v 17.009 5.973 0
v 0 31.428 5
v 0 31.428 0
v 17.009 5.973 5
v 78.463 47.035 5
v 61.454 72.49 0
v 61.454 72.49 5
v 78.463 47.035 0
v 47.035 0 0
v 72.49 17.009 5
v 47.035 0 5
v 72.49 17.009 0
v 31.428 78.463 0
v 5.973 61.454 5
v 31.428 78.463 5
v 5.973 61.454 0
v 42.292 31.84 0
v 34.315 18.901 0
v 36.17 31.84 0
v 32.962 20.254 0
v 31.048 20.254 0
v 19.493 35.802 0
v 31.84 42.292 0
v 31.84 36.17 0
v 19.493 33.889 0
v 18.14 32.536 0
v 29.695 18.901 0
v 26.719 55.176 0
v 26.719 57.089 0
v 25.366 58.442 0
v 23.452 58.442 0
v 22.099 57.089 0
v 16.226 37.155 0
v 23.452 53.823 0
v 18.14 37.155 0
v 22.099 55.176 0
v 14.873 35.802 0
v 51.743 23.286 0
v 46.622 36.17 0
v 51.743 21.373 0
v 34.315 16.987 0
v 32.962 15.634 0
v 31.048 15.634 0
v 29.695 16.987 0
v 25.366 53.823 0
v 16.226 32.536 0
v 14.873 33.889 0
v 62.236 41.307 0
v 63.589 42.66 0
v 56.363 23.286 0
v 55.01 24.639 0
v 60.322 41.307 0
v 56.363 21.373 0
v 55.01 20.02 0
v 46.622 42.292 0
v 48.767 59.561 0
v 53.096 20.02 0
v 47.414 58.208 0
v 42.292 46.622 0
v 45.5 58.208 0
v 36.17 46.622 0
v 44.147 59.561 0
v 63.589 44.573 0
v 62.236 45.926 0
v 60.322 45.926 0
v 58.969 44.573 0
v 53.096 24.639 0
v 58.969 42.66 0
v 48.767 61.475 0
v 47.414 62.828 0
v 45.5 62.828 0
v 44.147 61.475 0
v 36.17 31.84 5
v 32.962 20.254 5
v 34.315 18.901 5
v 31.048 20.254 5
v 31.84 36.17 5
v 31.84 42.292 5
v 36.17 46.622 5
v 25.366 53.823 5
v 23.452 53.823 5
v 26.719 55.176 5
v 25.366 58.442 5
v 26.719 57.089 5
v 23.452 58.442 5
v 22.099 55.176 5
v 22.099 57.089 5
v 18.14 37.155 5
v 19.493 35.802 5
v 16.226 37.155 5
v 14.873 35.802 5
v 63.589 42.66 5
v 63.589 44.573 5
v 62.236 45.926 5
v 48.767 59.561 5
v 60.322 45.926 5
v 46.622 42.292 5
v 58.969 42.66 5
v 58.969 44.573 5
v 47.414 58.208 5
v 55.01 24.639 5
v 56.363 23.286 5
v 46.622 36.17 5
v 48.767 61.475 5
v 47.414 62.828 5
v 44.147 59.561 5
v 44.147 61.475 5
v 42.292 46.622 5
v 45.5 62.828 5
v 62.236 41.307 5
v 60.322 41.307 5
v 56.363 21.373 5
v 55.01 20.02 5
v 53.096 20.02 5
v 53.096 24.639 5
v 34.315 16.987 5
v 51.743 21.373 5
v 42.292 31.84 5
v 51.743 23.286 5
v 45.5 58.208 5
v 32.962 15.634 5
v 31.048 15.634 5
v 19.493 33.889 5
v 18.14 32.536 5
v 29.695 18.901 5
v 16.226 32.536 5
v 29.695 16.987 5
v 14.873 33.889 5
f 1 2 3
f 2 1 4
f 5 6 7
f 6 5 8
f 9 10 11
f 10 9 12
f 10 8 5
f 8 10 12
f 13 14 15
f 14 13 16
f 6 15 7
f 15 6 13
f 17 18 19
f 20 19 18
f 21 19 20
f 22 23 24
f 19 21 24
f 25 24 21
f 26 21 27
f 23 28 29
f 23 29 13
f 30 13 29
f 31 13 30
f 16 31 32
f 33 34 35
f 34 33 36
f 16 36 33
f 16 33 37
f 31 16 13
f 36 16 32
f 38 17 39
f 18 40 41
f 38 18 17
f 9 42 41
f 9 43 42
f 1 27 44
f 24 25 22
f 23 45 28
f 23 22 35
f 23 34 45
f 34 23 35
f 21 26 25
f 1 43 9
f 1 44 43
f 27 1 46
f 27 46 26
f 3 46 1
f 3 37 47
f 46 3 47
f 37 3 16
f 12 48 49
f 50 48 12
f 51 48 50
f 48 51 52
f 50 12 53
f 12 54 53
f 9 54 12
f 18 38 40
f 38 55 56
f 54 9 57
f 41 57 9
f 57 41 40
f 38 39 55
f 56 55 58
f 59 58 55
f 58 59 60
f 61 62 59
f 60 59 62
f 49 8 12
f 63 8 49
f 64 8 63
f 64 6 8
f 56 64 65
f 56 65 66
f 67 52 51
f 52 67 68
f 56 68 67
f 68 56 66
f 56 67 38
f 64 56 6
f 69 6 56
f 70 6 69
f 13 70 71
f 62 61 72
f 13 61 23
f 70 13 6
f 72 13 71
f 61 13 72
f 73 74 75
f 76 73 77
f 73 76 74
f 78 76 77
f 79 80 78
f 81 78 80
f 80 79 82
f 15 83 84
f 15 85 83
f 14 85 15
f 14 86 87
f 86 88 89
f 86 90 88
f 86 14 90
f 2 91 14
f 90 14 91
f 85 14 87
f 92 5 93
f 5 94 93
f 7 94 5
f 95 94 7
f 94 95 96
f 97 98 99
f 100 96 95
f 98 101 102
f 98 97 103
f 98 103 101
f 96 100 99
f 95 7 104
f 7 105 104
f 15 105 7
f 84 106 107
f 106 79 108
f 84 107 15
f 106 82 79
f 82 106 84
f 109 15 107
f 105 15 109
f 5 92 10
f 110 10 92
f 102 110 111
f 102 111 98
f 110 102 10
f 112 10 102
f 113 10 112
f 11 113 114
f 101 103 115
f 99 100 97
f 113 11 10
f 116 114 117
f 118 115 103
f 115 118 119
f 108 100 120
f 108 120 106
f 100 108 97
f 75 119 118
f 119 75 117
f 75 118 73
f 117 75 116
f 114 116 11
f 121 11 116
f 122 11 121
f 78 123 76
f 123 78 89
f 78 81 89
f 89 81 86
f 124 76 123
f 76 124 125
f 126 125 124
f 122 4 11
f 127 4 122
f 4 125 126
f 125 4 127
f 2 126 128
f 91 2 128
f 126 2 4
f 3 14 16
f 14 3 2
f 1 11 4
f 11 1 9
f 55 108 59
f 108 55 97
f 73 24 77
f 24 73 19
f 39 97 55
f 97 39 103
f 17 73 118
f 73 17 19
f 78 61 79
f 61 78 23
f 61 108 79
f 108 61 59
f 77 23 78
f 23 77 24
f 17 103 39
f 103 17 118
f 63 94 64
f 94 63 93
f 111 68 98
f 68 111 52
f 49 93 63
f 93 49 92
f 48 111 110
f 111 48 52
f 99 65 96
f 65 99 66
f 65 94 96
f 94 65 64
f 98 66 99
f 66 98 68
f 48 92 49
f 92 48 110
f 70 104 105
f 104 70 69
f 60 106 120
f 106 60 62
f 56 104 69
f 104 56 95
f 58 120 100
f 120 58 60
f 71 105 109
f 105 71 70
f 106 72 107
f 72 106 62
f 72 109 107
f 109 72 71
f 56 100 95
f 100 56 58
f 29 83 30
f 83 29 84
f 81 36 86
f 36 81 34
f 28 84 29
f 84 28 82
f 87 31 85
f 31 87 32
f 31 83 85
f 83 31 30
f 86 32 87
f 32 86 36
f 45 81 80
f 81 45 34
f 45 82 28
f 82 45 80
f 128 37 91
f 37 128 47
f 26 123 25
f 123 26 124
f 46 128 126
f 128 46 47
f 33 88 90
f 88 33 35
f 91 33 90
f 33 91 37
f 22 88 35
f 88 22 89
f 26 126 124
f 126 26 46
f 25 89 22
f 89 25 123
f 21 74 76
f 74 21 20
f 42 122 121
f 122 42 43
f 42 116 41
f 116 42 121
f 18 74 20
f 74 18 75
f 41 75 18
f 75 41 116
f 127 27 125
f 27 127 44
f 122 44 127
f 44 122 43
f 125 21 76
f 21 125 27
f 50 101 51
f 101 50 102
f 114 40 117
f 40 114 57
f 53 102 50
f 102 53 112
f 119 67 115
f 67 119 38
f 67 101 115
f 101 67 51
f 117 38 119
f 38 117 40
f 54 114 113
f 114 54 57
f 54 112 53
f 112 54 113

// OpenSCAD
$fn = 32;

// ----------------------------------------------------------------------
// Polygon plate: 8-gon R40, 6 bolt windows
// ----------------------------------------------------------------------

// --- parameters (mm) ---
sides = 8;                // number of polygon sides
plate_r = 40;             // circumscribed radius of the polygon
bore_r = 8;               // centre bore radius
bolts = 6;                // number of bolt windows
ring_r = 22.48;           // bolt-circle radius
bolt_r = 2.5;             // bolt window radius
plate_t = 5;              // plate thickness, Z (extrusion height)
fit_tol = 0.05;           // declared fit tolerance (prompt contract)
free_tol = 0.2;           // declared free tolerance (prompt contract)

plate_d = 2 * plate_r;  // circumscribed diameter
bore_d = 2 * bore_r;  // centre bore diameter
bolt_d = 2 * bolt_r;  // bolt window diameter
ring_d = 2 * ring_r;  // bolt-circle diameter

profile = [[78.463, 47.035], [61.454, 72.49], [31.428, 78.463], [5.973, 61.454], [0, 31.428], [17.009, 5.973], [47.035, 0], [72.49, 17.009]];  // primary outline, 8 points, counter clockwise
void_1 = [[46.622, 42.292], [42.292, 46.622], [36.17, 46.622], [31.84, 42.292], [31.84, 36.17], [36.17, 31.84], [42.292, 31.84], [46.622, 36.17]];  // centre bore, 8 points
void_2 = [[63.589, 44.573], [62.236, 45.926], [60.322, 45.926], [58.969, 44.573], [58.969, 42.66], [60.322, 41.307], [62.236, 41.307], [63.589, 42.66]];  // bolt window 1, 8 points
void_3 = [[48.767, 61.475], [47.414, 62.828], [45.5, 62.828], [44.147, 61.475], [44.147, 59.561], [45.5, 58.208], [47.414, 58.208], [48.767, 59.561]];  // bolt window 2, 8 points
void_4 = [[26.719, 57.089], [25.366, 58.442], [23.452, 58.442], [22.099, 57.089], [22.099, 55.176], [23.452, 53.823], [25.366, 53.823], [26.719, 55.176]];  // bolt window 3, 8 points
void_5 = [[19.493, 35.802], [18.14, 37.155], [16.226, 37.155], [14.873, 35.802], [14.873, 33.889], [16.226, 32.536], [18.14, 32.536], [19.493, 33.889]];  // bolt window 4, 8 points
void_6 = [[34.315, 18.901], [32.962, 20.254], [31.048, 20.254], [29.695, 18.901], [29.695, 16.987], [31.048, 15.634], [32.962, 15.634], [34.315, 16.987]];  // bolt window 5, 8 points
void_7 = [[56.363, 23.286], [55.01, 24.639], [53.096, 24.639], [51.743, 23.286], [51.743, 21.373], [53.096, 20.02], [55.01, 20.02], [56.363, 21.373]];  // bolt window 6, 8 points

// --- the one profile operation ---
difference() {
  linear_extrude(height = plate_t) polygon(points = profile);
  translate([0, 0, -1])
    linear_extrude(height = plate_t + 2) polygon(points = void_1);
  translate([0, 0, -1])
    linear_extrude(height = plate_t + 2) polygon(points = void_2);
  translate([0, 0, -1])
    linear_extrude(height = plate_t + 2) polygon(points = void_3);
  translate([0, 0, -1])
    linear_extrude(height = plate_t + 2) polygon(points = void_4);
  translate([0, 0, -1])
    linear_extrude(height = plate_t + 2) polygon(points = void_5);
  translate([0, 0, -1])
    linear_extrude(height = plate_t + 2) polygon(points = void_6);
  translate([0, 0, -1])
    linear_extrude(height = plate_t + 2) polygon(points = void_7);
}
